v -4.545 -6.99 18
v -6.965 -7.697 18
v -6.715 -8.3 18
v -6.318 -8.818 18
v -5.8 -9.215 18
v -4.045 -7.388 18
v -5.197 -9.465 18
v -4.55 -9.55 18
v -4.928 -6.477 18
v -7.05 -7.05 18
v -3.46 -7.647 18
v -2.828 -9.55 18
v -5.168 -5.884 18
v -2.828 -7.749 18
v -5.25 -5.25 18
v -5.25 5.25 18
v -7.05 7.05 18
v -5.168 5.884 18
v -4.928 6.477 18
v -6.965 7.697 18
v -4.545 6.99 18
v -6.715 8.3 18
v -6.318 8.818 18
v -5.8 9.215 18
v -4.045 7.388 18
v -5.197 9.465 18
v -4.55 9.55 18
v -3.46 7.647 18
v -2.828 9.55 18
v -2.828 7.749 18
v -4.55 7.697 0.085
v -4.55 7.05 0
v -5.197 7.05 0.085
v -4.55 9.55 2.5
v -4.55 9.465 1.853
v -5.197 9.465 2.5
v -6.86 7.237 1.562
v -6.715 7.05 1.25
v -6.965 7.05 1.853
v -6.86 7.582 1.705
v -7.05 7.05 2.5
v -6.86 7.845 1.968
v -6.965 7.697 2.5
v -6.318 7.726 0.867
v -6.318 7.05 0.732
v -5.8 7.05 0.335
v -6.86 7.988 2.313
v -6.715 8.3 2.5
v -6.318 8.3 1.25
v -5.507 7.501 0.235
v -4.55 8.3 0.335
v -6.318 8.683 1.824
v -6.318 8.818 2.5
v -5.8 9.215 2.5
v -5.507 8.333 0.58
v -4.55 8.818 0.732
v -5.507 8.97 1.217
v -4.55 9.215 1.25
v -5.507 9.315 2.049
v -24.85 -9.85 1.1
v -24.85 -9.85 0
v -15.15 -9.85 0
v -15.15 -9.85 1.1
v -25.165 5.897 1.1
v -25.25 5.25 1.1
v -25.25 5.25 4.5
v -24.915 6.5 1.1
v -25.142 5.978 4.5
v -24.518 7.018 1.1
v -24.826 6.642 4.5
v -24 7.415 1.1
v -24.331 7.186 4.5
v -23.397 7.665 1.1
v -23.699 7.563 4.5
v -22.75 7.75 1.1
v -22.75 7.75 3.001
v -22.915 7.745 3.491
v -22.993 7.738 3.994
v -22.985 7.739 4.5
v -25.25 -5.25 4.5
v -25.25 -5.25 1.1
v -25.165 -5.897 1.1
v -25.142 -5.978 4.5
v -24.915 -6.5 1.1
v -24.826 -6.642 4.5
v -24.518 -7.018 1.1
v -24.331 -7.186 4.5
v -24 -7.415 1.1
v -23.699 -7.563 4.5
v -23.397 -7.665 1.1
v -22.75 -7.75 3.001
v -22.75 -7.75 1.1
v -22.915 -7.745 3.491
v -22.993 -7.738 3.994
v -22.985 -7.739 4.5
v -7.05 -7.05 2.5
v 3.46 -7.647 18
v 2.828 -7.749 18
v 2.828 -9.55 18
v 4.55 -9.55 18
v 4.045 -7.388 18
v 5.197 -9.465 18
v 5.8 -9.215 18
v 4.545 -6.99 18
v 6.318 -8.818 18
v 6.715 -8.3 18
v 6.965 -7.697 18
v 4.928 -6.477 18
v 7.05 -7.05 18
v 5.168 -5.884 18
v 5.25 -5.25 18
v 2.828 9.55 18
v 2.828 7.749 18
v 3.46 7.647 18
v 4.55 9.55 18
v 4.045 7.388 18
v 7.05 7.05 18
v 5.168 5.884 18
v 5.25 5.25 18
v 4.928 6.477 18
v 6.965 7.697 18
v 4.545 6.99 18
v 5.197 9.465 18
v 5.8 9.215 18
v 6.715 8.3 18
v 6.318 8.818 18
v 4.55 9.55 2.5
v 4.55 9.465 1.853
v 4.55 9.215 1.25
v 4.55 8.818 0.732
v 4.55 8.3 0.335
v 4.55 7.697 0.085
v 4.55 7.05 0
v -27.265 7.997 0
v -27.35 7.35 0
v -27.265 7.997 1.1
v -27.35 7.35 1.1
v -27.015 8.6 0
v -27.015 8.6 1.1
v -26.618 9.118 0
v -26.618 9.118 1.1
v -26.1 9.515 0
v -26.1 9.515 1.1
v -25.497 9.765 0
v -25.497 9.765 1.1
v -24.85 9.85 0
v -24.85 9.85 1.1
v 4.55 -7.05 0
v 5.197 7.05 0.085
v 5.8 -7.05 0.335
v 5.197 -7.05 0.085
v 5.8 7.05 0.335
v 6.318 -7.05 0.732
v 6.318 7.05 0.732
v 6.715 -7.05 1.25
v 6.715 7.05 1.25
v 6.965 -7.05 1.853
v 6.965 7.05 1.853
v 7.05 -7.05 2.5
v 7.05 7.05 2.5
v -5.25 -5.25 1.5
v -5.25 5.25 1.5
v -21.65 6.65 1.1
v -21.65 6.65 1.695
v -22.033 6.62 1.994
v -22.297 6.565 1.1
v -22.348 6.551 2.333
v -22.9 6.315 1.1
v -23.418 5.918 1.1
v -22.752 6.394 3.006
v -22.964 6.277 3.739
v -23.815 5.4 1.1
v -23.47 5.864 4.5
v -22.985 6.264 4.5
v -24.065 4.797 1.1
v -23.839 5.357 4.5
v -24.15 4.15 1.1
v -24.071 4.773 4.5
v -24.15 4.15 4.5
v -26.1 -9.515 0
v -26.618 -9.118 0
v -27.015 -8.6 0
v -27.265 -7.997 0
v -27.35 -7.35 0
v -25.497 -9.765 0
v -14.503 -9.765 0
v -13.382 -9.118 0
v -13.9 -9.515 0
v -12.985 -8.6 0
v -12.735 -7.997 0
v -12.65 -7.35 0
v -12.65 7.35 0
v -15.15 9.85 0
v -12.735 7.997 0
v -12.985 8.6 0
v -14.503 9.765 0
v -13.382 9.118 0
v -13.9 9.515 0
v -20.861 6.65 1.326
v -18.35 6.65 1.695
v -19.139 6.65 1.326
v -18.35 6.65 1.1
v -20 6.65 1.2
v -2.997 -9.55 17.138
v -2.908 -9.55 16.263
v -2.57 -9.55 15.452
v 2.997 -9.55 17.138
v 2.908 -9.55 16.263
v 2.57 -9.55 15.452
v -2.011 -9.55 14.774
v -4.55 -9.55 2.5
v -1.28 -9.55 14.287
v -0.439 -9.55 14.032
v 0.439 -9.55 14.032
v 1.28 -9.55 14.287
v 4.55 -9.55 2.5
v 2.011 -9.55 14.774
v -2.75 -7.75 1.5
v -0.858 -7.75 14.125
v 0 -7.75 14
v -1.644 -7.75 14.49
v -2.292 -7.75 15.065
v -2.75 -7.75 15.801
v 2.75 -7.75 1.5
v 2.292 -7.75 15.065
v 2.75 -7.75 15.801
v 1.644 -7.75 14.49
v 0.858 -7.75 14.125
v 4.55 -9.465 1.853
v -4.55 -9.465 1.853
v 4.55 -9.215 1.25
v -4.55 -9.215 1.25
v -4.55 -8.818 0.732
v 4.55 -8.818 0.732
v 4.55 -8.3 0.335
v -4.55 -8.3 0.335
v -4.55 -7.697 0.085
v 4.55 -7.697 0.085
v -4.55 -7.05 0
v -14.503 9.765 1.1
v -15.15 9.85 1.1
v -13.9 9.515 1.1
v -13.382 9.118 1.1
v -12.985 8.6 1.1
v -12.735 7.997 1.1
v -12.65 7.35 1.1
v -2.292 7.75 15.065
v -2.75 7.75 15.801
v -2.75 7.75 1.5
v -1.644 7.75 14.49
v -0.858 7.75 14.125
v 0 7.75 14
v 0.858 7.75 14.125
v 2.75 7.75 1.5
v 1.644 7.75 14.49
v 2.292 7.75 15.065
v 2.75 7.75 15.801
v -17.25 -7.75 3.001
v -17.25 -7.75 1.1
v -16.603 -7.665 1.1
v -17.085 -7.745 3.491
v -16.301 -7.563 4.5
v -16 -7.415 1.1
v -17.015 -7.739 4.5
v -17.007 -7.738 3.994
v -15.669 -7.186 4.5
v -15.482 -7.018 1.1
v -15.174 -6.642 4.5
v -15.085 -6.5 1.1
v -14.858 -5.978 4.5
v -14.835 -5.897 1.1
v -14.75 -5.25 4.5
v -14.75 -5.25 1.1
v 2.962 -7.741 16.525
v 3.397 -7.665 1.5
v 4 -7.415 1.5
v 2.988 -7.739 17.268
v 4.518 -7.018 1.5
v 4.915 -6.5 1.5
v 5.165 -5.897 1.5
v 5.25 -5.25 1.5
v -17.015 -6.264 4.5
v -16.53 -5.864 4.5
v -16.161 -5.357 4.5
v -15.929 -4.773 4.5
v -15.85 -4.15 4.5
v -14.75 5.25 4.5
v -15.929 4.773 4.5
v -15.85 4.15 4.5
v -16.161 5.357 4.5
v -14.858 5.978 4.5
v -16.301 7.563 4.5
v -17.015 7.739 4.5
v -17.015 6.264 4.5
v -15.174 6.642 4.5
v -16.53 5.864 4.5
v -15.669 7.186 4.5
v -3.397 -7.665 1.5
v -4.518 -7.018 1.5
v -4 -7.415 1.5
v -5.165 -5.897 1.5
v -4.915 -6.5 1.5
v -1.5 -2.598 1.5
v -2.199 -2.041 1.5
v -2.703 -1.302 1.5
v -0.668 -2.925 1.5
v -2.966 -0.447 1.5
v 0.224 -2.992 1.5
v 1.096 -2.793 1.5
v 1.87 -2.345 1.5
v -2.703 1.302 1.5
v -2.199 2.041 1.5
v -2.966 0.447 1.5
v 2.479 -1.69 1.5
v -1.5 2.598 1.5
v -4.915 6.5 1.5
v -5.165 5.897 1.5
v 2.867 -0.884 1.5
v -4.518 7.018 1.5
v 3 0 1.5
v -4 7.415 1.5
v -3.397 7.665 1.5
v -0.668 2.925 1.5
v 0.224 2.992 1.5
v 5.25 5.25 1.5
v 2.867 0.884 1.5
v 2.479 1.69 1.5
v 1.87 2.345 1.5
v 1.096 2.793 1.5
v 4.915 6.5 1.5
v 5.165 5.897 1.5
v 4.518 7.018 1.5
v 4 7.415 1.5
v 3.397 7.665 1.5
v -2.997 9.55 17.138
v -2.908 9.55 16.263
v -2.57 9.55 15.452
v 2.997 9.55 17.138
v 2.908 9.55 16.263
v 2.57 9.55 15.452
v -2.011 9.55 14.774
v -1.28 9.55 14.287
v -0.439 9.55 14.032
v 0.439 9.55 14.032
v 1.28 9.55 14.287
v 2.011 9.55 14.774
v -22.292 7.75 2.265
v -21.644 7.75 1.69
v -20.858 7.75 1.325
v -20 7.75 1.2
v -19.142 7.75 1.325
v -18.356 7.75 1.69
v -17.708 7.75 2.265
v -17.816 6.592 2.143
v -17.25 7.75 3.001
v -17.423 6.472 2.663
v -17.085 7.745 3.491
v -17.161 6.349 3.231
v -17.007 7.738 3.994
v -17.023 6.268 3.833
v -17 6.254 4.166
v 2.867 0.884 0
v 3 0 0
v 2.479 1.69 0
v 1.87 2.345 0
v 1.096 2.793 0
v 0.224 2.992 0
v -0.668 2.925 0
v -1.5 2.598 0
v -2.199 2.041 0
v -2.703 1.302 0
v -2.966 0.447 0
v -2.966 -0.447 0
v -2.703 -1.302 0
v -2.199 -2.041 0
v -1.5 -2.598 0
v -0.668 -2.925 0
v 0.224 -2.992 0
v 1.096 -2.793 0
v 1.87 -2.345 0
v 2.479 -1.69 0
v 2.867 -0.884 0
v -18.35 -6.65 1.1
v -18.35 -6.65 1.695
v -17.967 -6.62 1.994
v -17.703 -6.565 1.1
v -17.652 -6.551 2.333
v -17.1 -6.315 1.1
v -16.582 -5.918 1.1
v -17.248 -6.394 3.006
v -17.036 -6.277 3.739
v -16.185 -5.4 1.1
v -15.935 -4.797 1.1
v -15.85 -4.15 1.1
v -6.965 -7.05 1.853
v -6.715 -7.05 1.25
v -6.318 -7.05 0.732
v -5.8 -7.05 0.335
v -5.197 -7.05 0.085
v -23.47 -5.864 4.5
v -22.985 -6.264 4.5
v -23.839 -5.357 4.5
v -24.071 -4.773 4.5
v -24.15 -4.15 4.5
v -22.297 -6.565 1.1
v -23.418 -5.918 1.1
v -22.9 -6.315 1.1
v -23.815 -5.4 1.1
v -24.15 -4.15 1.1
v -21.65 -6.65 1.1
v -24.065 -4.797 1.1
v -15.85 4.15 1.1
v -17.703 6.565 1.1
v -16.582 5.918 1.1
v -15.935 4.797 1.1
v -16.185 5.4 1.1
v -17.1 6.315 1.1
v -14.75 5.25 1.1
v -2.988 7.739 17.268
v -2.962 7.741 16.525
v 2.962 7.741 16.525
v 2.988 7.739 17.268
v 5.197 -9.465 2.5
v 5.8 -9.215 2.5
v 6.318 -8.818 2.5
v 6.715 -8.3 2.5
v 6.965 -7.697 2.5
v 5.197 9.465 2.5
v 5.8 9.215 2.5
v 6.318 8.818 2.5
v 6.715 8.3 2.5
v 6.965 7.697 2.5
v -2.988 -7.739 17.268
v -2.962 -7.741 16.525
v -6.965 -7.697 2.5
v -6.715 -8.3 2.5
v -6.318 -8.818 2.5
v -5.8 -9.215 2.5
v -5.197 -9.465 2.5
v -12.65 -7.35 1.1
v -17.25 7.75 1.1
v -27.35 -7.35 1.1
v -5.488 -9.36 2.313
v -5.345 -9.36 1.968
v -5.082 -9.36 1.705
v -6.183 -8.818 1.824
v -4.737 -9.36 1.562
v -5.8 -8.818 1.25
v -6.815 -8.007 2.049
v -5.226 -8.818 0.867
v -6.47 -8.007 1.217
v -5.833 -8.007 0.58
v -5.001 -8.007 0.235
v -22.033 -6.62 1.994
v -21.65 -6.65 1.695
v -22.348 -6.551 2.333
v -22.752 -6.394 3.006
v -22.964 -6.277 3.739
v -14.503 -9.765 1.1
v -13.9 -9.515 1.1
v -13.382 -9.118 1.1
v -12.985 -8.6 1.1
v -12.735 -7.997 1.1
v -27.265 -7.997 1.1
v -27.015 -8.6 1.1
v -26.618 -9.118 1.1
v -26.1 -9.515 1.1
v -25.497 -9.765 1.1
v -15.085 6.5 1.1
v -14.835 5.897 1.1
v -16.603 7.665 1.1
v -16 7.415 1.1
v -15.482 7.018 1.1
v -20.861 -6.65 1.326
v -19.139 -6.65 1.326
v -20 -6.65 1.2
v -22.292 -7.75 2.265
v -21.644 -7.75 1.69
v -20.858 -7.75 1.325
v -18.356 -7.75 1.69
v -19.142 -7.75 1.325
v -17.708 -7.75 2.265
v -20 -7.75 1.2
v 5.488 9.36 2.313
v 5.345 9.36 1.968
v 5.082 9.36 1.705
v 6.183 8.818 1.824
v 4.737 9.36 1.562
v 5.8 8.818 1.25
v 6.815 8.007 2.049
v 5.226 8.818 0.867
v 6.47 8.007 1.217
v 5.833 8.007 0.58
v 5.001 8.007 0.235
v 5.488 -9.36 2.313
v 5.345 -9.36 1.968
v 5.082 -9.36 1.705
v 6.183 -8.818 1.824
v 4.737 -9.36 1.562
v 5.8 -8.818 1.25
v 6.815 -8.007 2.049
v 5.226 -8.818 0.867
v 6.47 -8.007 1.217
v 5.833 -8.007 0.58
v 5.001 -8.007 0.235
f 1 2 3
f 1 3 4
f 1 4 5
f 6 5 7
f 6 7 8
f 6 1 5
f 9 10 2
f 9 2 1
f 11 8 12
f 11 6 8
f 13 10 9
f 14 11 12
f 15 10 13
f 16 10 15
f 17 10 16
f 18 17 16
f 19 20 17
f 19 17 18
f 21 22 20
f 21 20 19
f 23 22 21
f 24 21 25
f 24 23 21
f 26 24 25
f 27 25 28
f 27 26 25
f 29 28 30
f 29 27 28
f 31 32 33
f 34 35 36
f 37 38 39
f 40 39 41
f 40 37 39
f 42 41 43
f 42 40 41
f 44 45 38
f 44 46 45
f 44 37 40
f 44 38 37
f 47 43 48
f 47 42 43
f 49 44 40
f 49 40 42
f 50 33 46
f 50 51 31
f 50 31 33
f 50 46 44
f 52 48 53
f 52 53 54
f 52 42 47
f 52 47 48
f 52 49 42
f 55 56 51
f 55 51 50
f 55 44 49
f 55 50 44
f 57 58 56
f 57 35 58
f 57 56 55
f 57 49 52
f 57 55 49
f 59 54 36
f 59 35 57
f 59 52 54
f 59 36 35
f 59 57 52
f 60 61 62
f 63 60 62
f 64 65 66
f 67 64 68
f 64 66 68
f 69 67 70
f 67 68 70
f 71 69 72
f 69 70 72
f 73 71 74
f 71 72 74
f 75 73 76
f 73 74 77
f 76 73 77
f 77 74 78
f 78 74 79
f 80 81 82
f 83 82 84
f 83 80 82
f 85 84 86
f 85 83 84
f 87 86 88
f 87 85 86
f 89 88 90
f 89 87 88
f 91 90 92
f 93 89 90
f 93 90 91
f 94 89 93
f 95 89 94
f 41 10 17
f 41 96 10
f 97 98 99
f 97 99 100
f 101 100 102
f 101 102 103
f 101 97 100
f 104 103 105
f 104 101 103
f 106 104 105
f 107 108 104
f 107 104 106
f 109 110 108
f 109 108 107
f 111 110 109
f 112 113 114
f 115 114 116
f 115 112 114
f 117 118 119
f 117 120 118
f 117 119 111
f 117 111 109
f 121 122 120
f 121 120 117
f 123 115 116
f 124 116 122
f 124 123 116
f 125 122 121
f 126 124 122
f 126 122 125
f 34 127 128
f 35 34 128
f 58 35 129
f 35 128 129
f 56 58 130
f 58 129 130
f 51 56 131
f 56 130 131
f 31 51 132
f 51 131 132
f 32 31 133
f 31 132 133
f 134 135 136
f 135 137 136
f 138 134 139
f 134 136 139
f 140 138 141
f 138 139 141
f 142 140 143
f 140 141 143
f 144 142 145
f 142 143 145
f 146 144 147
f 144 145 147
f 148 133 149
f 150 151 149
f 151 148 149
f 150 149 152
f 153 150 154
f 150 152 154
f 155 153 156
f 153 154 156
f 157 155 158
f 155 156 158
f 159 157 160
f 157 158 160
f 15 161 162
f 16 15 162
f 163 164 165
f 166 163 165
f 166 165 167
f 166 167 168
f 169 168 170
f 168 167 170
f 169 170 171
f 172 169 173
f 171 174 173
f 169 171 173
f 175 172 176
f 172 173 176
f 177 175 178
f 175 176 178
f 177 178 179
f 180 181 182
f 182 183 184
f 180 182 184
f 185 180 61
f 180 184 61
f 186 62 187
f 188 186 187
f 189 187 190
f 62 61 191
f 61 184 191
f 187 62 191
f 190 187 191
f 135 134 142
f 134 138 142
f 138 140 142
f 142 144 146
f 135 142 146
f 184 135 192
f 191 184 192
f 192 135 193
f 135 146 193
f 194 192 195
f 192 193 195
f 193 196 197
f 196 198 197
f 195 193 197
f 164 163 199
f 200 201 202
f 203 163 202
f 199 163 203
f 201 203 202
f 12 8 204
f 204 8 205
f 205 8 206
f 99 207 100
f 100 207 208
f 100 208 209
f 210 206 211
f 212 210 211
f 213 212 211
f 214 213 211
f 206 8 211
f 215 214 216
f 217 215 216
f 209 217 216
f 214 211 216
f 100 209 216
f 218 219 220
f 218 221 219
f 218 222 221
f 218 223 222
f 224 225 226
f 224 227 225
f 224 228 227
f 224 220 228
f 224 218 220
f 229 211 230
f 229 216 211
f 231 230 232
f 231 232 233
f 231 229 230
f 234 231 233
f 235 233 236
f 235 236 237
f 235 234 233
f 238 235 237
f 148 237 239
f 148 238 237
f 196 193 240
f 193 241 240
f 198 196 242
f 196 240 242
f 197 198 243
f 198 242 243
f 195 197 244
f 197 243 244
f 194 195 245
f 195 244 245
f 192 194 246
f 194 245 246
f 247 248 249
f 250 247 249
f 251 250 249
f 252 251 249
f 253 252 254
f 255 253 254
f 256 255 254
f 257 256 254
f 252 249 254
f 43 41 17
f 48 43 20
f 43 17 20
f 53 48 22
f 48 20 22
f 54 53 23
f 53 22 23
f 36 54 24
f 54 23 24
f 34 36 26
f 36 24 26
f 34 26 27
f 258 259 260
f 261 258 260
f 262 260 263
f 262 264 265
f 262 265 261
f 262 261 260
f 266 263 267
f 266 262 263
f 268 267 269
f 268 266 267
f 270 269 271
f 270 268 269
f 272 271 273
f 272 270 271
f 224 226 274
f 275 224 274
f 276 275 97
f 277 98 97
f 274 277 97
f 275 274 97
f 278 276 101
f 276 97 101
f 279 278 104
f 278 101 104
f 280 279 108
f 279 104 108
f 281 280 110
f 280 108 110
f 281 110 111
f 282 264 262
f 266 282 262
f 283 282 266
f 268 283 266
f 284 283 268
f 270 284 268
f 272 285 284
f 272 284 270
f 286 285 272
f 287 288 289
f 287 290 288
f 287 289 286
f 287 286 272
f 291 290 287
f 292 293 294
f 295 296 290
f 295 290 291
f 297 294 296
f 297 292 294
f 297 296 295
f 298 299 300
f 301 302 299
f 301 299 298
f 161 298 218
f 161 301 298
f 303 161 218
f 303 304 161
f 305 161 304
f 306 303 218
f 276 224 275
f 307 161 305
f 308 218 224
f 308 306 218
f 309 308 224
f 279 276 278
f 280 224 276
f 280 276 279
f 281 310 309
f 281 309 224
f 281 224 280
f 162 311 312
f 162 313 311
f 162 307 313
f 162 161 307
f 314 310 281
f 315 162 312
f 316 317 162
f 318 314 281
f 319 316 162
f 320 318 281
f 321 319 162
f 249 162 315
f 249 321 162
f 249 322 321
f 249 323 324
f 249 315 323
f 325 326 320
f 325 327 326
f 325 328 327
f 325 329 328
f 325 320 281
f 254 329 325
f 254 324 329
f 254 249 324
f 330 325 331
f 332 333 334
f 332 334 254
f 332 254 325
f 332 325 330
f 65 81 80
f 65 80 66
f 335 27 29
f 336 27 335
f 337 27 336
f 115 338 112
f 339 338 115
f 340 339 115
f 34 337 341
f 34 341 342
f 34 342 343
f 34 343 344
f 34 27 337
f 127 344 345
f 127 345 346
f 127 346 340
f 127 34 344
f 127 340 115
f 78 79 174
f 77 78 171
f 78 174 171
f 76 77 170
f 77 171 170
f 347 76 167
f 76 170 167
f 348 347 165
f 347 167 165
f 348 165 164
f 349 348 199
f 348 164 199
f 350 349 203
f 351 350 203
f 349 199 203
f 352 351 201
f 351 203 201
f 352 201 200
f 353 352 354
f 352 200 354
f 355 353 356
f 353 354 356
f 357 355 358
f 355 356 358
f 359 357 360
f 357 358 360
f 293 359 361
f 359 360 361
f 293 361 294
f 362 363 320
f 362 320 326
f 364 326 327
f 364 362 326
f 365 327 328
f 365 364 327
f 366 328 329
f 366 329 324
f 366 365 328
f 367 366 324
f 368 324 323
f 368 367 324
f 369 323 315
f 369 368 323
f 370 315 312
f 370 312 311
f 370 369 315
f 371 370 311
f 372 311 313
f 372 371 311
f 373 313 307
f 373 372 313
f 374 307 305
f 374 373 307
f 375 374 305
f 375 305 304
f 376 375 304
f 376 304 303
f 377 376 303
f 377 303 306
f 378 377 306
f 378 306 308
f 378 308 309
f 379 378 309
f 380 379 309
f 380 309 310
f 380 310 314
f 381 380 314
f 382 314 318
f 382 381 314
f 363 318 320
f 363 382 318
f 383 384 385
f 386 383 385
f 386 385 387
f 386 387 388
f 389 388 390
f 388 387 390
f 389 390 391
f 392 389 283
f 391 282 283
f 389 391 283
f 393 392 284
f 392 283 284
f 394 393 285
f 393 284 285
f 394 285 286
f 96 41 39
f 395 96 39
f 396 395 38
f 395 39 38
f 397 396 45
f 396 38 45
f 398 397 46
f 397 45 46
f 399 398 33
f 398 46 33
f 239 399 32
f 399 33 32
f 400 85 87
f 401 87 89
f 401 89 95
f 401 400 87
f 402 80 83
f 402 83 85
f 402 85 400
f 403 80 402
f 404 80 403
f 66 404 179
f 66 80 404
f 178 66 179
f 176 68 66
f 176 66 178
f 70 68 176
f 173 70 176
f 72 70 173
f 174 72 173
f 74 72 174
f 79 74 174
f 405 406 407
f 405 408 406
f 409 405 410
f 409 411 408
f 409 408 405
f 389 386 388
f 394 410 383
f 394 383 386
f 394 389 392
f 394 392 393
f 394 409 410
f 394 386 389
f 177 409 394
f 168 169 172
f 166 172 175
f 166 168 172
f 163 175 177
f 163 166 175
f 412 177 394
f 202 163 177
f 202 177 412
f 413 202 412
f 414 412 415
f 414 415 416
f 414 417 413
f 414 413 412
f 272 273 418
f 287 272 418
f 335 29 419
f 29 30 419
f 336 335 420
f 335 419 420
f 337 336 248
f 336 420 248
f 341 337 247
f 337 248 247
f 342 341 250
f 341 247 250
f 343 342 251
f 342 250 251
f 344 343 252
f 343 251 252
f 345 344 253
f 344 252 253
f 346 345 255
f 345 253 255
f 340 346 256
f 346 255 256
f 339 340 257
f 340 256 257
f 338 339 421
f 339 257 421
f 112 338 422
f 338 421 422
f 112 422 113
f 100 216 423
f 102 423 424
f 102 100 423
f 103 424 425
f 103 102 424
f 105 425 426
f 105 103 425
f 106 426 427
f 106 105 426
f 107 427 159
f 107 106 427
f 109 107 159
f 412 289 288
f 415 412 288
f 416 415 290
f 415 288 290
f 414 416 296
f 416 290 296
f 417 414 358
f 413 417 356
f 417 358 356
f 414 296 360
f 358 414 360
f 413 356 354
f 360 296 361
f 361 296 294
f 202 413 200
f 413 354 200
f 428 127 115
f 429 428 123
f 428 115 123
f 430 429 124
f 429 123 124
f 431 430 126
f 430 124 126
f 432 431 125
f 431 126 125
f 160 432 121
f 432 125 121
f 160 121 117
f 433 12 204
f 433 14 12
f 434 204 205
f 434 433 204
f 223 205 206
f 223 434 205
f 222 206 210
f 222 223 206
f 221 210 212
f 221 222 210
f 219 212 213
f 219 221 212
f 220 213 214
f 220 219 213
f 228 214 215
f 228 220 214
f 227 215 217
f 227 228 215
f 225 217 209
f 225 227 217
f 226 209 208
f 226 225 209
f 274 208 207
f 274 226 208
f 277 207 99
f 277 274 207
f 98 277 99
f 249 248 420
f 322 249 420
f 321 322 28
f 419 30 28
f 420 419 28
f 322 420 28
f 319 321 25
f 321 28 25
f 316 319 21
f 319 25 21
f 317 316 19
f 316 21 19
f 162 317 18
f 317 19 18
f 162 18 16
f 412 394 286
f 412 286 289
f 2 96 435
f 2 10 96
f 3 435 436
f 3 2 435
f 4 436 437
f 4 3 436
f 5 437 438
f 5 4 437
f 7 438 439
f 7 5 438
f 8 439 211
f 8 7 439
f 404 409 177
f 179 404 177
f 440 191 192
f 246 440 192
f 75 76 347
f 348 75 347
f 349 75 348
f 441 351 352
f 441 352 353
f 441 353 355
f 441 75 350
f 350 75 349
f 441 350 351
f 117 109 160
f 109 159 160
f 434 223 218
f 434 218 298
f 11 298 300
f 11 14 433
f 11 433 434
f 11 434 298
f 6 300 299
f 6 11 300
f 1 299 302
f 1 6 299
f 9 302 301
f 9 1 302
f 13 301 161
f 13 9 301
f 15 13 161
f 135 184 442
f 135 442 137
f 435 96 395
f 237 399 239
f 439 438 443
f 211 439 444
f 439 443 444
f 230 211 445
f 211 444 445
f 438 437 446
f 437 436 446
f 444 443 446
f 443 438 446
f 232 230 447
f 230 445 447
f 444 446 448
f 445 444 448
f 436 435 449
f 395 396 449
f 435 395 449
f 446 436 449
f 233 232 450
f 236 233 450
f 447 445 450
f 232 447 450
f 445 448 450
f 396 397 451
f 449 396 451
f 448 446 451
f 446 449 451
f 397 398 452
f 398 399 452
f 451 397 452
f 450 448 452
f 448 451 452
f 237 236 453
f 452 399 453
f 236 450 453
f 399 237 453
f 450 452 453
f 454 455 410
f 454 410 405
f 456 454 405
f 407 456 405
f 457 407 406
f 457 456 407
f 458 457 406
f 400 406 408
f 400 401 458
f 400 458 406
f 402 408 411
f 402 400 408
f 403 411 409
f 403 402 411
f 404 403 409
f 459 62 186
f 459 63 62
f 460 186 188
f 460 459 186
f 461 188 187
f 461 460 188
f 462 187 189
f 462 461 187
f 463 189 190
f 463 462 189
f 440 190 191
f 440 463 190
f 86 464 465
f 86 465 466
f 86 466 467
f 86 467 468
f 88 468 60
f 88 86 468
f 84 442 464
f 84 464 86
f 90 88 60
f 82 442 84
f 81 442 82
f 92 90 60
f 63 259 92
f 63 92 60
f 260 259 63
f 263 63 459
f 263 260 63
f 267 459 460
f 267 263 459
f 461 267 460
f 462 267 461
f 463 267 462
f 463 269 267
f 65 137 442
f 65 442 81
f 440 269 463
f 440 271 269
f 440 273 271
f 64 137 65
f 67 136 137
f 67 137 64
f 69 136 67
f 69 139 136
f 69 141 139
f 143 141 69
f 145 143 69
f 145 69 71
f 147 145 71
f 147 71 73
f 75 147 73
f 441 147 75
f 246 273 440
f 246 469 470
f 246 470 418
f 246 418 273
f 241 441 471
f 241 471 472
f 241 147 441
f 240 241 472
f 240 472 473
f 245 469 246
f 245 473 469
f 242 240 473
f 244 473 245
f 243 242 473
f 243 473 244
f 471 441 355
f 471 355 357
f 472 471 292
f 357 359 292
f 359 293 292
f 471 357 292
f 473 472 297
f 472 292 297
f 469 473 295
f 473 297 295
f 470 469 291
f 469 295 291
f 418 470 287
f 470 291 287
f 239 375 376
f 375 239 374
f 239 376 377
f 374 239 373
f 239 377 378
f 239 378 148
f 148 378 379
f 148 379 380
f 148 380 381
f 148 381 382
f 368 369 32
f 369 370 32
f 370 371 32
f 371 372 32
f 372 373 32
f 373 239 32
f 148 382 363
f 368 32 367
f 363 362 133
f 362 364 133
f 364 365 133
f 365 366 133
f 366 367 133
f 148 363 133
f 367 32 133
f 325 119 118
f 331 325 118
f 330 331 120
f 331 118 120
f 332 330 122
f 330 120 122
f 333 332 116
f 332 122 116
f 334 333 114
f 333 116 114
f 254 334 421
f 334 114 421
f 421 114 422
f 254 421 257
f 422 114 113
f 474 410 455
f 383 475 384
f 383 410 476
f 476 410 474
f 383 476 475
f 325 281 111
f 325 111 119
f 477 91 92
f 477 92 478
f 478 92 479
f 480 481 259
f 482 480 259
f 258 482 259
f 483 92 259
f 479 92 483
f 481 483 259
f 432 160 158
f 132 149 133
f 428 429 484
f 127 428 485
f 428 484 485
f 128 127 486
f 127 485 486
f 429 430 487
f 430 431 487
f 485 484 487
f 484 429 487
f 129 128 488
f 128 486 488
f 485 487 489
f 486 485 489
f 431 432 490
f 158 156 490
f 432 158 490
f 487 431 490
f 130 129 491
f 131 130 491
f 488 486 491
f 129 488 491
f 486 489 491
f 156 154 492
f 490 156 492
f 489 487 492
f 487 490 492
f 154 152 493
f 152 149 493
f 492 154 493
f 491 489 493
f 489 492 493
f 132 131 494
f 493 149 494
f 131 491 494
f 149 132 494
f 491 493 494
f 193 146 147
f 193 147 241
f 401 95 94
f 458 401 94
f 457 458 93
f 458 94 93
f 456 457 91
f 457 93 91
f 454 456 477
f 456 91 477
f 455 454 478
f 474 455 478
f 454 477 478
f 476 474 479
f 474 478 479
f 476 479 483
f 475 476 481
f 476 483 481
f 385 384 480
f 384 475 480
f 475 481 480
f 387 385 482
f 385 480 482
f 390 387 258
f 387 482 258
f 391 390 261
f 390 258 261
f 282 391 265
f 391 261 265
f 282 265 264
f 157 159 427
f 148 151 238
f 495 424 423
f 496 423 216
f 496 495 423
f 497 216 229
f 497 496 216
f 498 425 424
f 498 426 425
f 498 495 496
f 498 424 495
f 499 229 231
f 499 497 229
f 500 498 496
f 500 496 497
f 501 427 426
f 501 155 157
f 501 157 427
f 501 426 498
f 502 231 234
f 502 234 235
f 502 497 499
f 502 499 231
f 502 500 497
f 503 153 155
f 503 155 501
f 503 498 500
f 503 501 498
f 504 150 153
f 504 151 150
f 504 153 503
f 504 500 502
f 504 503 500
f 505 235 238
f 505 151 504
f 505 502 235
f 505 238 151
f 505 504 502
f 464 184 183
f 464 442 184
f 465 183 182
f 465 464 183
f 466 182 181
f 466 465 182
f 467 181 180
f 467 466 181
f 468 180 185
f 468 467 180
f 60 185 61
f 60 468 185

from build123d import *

# Parameters (mm, degrees)
F0_W     = 10.5
F0_H     = 15.5
F0_R     = 3
F1_DEPTH = 1.5
F0_W_2   = 14.1
F0_H_2   = 19.1
F2_DEPTH = 18
F0_W_3   = 14.7
F0_H_3   = 19.7
F0_W_4   = 8.3
F0_H_4   = 13.3
F3_DEPTH = 1.1
F4_DEPTH = 4.5
F5_R     = 2.5
F5_2_R   = 2.5
F6_R     = 3
F7_DEPTH = 12.5


with BuildPart() as f1:
    # F0 (on Top) → F1 (new body)
    with BuildSketch(Plane.XY):
        Rectangle(F0_W, F0_H)
        Circle(F0_R, mode=Mode.SUBTRACT)
    extrude(amount=F1_DEPTH)

    # F0 (on Top) → F2 (join)
    with BuildSketch(Plane.XY):
        Rectangle(F0_W_2, F0_H_2)
        Rectangle(F0_W, F0_H, mode=Mode.SUBTRACT)
    extrude(amount=F2_DEPTH)

    # F5
    f5_edges = [f1.edges().sort_by_distance(p)[0] for p in [
        (7.05, 0, 0),
        (7.05, 9.55, 9),
        (0, 9.55, 0),
        (-7.05, 0, 0),
        (7.05, -9.55, 9),
        (-7.05, -9.55, 9),
        (0, -9.55, 0),
        (-7.05, 9.55, 9),
        (-5.25, 7.75, 9.75),
        (5.25, 7.75, 9.75),
        (5.25, -7.75, 9.75),
        (-5.25, -7.75, 9.75),
    ]]
    fillet(f5_edges, radius=F5_R)


with BuildPart() as f3:
    # F0 (on Top) → F3 (new body)
    with BuildSketch(Plane.XY):
        with Locations((-20, 0)):
            Rectangle(F0_W_3, F0_H_3)
        with Locations((-20, 0)):
            Rectangle(F0_W, F0_H, mode=Mode.SUBTRACT)
        with Locations((-20, 0)):
            Rectangle(F0_W_4, F0_H_4)
    extrude(amount=F3_DEPTH)

    # F0 (on Top) → F4 (join)
    with BuildSketch(Plane.XY):
        with Locations((-20, 0)):
            Rectangle(F0_W, F0_H)
        with Locations((-20, 0)):
            Rectangle(F0_W_4, F0_H_4, mode=Mode.SUBTRACT)
    extrude(amount=F4_DEPTH)

    # F5#2
    f5_2_edges = [f3.edges().sort_by_distance(p)[0] for p in [
        (-12.65, -9.85, 0.55),
        (-27.35, -9.85, 0.55),
        (-14.75, -7.75, 2.8),
        (-15.85, -6.65, 2.8),
        (-15.85, 6.65, 2.8),
        (-24.15, 6.65, 2.8),
        (-12.65, 9.85, 0.55),
        (-14.75, 7.75, 2.8),
        (-24.15, -6.65, 2.8),
        (-25.25, 7.75, 2.8),
        (-27.35, 9.85, 0.55),
        (-25.25, -7.75, 2.8),
    ]]
    fillet(f5_2_edges, radius=F5_2_R)


with BuildPart() as f7_tool:
    # F6 (on Front) → F7 (new body, symmetric)
    with BuildSketch(Plane.XZ):
        with Locations((0, 17)):
            Circle(F6_R)
        with Locations((-20, 4.2)):
            Circle(F6_R)
    extrude(amount=F7_DEPTH, both=True)


with BuildPart() as f1_1:
    add(f1.part)

    # F7: cut by f7_tool
    add(f7_tool.part, mode=Mode.SUBTRACT)


with BuildPart() as f3_1:
    add(f3.part)

    # F7: cut by f7_tool
    add(f7_tool.part, mode=Mode.SUBTRACT)


solid = Compound([f1_1.part, f3_1.part])
